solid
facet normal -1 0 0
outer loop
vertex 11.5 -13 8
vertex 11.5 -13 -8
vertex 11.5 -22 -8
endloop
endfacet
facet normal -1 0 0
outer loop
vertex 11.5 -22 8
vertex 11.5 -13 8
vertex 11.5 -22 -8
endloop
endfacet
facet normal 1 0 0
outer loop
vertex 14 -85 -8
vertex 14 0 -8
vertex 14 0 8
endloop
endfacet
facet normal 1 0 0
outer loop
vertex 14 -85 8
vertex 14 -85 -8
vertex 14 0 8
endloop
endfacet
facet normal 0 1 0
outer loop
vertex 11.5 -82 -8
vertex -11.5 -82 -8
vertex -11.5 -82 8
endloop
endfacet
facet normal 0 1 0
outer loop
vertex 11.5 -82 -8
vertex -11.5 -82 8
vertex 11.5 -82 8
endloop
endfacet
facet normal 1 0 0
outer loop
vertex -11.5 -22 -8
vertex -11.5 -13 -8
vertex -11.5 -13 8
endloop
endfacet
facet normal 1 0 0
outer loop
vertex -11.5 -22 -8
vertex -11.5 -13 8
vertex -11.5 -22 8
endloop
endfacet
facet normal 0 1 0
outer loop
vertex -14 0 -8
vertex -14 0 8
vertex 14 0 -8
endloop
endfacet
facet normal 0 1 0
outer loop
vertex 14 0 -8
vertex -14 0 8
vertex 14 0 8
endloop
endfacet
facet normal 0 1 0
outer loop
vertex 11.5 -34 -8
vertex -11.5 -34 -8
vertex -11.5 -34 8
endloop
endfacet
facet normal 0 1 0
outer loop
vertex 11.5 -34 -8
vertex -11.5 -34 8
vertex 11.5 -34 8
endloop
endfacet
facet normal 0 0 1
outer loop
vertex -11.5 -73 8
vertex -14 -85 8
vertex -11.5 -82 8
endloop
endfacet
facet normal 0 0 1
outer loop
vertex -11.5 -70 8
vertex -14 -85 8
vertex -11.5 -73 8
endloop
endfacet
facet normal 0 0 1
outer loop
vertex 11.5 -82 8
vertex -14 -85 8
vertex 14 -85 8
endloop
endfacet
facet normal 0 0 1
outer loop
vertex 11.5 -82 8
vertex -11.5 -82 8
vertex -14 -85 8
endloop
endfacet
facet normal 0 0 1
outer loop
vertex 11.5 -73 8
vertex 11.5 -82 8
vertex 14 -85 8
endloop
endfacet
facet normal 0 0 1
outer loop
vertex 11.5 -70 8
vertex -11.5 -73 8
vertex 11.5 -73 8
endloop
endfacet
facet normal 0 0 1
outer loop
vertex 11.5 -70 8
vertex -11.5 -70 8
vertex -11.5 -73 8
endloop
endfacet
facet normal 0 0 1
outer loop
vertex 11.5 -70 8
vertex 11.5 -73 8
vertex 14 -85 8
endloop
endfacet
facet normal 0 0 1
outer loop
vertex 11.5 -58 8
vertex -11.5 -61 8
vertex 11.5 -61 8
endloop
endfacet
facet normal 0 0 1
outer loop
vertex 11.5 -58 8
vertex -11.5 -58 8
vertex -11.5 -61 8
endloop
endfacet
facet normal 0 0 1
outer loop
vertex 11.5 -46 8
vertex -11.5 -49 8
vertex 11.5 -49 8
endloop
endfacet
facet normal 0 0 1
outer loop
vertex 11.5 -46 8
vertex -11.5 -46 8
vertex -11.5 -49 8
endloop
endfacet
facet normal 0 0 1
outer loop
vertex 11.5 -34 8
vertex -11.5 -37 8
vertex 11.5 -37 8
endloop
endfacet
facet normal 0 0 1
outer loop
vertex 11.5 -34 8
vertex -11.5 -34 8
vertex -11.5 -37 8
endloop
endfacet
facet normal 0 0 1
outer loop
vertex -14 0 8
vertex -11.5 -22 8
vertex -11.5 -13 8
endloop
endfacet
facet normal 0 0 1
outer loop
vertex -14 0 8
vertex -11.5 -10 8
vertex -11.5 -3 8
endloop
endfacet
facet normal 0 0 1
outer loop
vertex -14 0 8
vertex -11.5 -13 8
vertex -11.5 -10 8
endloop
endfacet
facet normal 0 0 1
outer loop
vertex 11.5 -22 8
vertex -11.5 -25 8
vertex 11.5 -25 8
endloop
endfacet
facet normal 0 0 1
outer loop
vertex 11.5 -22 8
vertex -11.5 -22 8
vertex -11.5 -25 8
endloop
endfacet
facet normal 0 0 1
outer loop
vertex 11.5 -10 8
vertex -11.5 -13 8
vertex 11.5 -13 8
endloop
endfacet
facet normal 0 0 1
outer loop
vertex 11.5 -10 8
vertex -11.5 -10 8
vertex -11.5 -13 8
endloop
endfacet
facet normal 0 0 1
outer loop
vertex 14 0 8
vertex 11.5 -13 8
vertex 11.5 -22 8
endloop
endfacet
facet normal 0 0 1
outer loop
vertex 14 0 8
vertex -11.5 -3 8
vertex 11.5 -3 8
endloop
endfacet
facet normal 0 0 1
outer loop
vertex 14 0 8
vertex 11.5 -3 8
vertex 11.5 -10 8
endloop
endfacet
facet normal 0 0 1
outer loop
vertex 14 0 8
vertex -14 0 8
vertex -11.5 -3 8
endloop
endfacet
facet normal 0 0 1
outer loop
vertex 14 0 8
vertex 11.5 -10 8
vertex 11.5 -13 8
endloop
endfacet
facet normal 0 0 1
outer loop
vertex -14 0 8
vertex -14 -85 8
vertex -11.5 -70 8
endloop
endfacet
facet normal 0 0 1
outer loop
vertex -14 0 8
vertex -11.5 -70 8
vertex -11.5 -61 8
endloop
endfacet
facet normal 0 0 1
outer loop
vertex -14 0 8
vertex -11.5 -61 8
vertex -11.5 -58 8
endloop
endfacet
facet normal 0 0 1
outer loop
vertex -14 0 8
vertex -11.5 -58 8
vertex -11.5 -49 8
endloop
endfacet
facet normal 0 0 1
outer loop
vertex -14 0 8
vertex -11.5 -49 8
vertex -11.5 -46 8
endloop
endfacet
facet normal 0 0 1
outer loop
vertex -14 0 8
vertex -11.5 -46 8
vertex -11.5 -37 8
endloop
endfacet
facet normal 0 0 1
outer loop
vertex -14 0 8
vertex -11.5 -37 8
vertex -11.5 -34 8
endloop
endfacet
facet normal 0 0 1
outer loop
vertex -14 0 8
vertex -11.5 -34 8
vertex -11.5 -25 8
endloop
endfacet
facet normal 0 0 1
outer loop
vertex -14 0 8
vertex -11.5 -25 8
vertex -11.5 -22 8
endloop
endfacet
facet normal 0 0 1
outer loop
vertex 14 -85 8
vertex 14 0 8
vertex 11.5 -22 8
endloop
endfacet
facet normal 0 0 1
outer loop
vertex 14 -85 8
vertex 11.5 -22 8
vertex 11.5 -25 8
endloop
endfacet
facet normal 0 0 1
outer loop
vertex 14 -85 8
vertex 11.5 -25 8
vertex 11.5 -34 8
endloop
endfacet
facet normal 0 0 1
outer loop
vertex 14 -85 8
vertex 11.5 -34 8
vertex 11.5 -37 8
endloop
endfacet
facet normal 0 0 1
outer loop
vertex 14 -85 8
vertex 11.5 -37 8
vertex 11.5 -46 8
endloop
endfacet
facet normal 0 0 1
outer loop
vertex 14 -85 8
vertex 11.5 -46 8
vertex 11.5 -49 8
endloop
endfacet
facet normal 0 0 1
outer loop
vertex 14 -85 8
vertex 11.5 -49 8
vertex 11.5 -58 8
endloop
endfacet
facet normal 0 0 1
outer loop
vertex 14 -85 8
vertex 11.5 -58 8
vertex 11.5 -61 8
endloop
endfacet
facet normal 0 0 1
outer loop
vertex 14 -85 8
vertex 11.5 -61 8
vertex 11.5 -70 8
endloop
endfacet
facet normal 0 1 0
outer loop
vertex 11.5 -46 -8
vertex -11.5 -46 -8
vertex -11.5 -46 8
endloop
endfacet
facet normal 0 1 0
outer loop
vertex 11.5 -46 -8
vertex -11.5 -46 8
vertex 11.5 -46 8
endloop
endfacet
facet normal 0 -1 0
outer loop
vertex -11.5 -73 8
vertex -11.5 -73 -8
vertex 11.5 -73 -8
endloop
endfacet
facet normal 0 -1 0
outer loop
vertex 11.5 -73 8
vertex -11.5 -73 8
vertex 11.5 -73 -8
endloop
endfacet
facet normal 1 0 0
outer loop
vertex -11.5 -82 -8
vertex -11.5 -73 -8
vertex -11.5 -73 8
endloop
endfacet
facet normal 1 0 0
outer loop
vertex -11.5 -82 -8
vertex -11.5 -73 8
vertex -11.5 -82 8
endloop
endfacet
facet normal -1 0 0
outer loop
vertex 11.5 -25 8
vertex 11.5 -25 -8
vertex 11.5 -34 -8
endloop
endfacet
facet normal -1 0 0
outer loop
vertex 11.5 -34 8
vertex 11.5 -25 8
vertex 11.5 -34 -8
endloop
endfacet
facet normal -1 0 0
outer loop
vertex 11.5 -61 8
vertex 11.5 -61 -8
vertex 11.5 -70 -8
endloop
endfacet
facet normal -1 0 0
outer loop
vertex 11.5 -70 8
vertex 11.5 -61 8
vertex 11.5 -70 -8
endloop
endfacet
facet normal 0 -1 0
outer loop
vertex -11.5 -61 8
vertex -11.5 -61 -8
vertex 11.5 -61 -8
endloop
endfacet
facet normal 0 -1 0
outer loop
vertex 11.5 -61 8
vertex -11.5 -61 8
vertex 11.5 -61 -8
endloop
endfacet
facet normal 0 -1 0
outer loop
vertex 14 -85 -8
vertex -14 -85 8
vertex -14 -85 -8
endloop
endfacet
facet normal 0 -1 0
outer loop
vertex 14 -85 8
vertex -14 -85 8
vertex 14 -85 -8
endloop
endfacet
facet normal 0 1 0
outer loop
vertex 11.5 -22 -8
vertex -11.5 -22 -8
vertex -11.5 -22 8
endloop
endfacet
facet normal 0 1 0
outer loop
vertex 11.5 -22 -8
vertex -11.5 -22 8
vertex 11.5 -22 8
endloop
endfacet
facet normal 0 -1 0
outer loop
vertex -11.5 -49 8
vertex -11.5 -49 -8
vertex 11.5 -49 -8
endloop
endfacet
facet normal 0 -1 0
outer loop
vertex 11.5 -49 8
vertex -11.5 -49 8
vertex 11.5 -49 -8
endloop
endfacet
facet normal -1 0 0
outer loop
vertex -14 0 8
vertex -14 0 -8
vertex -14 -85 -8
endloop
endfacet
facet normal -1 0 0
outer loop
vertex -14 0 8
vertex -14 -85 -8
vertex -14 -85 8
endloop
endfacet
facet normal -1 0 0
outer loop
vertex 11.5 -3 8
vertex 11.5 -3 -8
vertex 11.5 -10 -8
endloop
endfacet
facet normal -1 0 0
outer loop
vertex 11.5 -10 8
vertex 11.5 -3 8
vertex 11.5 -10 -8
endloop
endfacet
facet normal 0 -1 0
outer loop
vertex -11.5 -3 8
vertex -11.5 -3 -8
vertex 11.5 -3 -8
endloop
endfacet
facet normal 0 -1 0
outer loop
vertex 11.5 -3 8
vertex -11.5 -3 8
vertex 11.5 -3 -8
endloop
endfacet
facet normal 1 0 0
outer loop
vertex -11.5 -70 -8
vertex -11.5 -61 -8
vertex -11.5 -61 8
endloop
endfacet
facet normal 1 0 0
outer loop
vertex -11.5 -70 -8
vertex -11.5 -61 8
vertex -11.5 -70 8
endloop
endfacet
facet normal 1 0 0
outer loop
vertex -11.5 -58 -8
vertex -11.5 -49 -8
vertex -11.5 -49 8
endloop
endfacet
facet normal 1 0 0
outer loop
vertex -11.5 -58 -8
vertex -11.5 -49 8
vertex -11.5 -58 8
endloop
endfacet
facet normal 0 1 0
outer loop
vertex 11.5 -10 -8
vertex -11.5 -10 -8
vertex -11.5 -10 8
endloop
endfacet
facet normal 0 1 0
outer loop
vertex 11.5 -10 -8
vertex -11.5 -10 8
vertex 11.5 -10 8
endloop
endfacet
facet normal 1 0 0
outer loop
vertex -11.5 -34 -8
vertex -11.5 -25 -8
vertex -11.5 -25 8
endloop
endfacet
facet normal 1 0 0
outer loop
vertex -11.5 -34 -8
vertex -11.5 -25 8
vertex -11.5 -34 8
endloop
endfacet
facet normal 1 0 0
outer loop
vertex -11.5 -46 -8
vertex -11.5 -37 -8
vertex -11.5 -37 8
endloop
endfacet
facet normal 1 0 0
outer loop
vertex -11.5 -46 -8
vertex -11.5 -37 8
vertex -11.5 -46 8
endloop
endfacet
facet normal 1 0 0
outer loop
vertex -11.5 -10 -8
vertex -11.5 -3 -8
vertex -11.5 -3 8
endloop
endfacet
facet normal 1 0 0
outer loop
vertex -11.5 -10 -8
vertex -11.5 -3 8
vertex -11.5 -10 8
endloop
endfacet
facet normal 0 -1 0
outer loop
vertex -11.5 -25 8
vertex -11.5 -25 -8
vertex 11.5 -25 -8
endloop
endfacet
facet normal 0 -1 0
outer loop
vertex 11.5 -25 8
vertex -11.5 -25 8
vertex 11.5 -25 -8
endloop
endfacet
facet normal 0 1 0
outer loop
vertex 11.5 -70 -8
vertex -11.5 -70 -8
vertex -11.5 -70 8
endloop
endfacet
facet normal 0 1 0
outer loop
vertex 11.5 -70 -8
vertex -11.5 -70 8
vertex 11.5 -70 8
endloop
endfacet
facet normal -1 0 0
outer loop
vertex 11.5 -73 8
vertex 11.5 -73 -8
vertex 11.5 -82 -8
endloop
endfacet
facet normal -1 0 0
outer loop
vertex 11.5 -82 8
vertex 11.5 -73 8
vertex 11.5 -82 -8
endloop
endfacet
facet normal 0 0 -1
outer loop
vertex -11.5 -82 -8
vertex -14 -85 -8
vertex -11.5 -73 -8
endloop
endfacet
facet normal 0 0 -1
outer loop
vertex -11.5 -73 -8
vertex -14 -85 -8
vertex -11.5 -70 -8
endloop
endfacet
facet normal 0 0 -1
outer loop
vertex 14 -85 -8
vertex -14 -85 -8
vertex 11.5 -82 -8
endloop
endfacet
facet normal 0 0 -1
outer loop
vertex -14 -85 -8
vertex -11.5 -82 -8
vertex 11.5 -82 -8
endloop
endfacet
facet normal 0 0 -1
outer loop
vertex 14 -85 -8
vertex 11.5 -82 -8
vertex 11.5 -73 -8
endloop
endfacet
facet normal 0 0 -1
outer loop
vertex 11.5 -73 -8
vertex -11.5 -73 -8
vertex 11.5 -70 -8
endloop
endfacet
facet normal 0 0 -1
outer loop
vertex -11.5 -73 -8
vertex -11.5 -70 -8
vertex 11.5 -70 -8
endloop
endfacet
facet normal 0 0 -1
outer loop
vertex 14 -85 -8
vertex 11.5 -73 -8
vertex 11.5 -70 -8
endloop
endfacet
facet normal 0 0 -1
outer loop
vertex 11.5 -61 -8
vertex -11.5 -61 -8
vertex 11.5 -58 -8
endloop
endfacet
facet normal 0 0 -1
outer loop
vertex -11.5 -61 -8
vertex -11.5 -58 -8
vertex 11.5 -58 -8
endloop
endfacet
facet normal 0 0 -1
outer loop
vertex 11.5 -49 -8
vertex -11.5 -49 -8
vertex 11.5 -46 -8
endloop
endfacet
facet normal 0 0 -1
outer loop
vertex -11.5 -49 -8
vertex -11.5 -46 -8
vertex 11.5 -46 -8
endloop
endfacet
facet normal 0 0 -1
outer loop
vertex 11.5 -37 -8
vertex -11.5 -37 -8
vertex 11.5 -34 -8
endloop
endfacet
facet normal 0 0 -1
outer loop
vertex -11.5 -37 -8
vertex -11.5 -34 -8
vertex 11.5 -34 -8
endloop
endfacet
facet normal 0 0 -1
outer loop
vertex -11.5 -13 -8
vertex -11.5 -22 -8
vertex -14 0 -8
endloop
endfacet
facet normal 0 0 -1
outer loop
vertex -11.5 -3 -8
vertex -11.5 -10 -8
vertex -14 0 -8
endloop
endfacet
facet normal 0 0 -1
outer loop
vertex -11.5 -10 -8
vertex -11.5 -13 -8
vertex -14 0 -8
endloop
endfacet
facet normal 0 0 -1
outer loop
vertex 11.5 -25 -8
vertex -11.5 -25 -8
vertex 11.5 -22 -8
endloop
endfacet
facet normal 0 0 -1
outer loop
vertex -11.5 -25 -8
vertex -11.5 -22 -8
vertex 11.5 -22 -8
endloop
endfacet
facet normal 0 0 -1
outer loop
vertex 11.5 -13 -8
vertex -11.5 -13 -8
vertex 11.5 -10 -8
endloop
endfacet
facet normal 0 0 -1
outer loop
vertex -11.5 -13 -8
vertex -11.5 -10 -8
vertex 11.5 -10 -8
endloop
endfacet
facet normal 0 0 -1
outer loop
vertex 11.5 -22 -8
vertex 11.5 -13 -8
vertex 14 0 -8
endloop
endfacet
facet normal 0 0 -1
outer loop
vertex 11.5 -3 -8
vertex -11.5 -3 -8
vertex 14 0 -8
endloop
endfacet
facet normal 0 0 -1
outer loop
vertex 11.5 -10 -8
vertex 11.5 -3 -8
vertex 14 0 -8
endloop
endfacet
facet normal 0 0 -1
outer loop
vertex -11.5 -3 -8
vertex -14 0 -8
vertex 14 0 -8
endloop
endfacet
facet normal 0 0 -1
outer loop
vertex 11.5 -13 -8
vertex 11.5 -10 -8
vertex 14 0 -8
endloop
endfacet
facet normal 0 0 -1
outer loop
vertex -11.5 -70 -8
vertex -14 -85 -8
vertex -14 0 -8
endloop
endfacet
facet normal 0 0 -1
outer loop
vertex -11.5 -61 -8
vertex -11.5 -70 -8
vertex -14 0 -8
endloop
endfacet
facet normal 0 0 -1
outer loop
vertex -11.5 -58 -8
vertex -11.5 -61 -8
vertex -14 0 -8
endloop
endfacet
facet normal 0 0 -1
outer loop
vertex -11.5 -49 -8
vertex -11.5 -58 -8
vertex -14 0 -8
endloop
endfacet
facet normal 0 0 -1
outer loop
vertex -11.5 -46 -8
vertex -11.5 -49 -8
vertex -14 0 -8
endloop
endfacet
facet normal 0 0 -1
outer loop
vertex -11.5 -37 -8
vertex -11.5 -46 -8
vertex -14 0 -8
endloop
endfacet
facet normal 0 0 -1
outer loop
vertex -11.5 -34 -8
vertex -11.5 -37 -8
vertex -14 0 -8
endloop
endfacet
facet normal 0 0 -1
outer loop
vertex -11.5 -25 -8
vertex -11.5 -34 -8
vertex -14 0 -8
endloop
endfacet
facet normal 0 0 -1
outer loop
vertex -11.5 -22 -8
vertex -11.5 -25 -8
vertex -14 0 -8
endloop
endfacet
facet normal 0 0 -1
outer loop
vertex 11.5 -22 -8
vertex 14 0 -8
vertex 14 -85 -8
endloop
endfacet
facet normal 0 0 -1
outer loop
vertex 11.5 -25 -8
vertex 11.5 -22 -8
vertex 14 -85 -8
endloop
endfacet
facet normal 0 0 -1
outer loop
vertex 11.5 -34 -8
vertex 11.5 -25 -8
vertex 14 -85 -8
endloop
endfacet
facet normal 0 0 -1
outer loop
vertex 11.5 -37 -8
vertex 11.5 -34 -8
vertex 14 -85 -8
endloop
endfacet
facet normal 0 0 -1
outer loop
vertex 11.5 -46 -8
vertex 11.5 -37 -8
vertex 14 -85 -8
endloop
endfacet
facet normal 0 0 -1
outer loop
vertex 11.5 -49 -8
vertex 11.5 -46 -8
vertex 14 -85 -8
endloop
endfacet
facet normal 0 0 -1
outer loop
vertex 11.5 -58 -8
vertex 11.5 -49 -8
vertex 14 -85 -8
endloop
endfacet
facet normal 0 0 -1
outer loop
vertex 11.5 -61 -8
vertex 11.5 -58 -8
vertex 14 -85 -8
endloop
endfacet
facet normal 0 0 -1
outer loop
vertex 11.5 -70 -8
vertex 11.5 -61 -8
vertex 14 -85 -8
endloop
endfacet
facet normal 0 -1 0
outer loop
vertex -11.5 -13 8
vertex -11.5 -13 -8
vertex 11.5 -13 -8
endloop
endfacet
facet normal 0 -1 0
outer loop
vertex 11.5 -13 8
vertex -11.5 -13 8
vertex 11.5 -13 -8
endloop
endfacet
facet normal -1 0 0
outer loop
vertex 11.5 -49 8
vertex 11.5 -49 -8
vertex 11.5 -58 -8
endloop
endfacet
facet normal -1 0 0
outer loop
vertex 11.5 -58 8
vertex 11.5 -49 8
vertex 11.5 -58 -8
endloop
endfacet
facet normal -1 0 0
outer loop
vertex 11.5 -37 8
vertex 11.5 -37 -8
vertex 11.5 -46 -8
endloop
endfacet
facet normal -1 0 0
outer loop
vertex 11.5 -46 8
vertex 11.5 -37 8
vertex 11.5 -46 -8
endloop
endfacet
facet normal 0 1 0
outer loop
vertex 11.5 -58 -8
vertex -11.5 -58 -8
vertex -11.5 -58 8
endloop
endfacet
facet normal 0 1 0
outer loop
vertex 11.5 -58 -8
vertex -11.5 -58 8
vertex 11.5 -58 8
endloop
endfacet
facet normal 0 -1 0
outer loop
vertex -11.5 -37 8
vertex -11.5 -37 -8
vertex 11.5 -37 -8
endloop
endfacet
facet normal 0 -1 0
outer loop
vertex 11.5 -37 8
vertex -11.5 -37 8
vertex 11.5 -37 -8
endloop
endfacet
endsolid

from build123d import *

# Parameters (mm, degrees)
F0_W     = 28
F0_H     = 16
F1_DEPTH = 85
F2_W     = 23
F2_H     = 9
F2_H_2   = 7
F3_DEPTH = 25


with BuildPart() as f1:
    # F0 (on Front) → F1 (new body)
    with BuildSketch(Plane.XZ):
        Rectangle(F0_W, F0_H)
    extrude(amount=F1_DEPTH)

    # F2 (on face) → F3 (cut)
    with BuildSketch(Plane(origin=(0, 0, -8), x_dir=(1, 0, 0), z_dir=(0, 0, -1))):
        with Locations((0, 77.5)):
            Rectangle(F2_W, F2_H)
        with Locations((0, 65.5)):
            Rectangle(F2_W, F2_H)
        with Locations((0, 53.5)):
            Rectangle(F2_W, F2_H)
        with Locations((0, 41.5)):
            Rectangle(F2_W, F2_H)
        with Locations((0, 29.5)):
            Rectangle(F2_W, F2_H)
        with Locations((0, 17.5)):
            Rectangle(F2_W, F2_H)
        with Locations((0, 6.5)):
            Rectangle(F2_W, F2_H_2)
    extrude(amount=-F3_DEPTH, mode=Mode.SUBTRACT)


solid = f1.part
